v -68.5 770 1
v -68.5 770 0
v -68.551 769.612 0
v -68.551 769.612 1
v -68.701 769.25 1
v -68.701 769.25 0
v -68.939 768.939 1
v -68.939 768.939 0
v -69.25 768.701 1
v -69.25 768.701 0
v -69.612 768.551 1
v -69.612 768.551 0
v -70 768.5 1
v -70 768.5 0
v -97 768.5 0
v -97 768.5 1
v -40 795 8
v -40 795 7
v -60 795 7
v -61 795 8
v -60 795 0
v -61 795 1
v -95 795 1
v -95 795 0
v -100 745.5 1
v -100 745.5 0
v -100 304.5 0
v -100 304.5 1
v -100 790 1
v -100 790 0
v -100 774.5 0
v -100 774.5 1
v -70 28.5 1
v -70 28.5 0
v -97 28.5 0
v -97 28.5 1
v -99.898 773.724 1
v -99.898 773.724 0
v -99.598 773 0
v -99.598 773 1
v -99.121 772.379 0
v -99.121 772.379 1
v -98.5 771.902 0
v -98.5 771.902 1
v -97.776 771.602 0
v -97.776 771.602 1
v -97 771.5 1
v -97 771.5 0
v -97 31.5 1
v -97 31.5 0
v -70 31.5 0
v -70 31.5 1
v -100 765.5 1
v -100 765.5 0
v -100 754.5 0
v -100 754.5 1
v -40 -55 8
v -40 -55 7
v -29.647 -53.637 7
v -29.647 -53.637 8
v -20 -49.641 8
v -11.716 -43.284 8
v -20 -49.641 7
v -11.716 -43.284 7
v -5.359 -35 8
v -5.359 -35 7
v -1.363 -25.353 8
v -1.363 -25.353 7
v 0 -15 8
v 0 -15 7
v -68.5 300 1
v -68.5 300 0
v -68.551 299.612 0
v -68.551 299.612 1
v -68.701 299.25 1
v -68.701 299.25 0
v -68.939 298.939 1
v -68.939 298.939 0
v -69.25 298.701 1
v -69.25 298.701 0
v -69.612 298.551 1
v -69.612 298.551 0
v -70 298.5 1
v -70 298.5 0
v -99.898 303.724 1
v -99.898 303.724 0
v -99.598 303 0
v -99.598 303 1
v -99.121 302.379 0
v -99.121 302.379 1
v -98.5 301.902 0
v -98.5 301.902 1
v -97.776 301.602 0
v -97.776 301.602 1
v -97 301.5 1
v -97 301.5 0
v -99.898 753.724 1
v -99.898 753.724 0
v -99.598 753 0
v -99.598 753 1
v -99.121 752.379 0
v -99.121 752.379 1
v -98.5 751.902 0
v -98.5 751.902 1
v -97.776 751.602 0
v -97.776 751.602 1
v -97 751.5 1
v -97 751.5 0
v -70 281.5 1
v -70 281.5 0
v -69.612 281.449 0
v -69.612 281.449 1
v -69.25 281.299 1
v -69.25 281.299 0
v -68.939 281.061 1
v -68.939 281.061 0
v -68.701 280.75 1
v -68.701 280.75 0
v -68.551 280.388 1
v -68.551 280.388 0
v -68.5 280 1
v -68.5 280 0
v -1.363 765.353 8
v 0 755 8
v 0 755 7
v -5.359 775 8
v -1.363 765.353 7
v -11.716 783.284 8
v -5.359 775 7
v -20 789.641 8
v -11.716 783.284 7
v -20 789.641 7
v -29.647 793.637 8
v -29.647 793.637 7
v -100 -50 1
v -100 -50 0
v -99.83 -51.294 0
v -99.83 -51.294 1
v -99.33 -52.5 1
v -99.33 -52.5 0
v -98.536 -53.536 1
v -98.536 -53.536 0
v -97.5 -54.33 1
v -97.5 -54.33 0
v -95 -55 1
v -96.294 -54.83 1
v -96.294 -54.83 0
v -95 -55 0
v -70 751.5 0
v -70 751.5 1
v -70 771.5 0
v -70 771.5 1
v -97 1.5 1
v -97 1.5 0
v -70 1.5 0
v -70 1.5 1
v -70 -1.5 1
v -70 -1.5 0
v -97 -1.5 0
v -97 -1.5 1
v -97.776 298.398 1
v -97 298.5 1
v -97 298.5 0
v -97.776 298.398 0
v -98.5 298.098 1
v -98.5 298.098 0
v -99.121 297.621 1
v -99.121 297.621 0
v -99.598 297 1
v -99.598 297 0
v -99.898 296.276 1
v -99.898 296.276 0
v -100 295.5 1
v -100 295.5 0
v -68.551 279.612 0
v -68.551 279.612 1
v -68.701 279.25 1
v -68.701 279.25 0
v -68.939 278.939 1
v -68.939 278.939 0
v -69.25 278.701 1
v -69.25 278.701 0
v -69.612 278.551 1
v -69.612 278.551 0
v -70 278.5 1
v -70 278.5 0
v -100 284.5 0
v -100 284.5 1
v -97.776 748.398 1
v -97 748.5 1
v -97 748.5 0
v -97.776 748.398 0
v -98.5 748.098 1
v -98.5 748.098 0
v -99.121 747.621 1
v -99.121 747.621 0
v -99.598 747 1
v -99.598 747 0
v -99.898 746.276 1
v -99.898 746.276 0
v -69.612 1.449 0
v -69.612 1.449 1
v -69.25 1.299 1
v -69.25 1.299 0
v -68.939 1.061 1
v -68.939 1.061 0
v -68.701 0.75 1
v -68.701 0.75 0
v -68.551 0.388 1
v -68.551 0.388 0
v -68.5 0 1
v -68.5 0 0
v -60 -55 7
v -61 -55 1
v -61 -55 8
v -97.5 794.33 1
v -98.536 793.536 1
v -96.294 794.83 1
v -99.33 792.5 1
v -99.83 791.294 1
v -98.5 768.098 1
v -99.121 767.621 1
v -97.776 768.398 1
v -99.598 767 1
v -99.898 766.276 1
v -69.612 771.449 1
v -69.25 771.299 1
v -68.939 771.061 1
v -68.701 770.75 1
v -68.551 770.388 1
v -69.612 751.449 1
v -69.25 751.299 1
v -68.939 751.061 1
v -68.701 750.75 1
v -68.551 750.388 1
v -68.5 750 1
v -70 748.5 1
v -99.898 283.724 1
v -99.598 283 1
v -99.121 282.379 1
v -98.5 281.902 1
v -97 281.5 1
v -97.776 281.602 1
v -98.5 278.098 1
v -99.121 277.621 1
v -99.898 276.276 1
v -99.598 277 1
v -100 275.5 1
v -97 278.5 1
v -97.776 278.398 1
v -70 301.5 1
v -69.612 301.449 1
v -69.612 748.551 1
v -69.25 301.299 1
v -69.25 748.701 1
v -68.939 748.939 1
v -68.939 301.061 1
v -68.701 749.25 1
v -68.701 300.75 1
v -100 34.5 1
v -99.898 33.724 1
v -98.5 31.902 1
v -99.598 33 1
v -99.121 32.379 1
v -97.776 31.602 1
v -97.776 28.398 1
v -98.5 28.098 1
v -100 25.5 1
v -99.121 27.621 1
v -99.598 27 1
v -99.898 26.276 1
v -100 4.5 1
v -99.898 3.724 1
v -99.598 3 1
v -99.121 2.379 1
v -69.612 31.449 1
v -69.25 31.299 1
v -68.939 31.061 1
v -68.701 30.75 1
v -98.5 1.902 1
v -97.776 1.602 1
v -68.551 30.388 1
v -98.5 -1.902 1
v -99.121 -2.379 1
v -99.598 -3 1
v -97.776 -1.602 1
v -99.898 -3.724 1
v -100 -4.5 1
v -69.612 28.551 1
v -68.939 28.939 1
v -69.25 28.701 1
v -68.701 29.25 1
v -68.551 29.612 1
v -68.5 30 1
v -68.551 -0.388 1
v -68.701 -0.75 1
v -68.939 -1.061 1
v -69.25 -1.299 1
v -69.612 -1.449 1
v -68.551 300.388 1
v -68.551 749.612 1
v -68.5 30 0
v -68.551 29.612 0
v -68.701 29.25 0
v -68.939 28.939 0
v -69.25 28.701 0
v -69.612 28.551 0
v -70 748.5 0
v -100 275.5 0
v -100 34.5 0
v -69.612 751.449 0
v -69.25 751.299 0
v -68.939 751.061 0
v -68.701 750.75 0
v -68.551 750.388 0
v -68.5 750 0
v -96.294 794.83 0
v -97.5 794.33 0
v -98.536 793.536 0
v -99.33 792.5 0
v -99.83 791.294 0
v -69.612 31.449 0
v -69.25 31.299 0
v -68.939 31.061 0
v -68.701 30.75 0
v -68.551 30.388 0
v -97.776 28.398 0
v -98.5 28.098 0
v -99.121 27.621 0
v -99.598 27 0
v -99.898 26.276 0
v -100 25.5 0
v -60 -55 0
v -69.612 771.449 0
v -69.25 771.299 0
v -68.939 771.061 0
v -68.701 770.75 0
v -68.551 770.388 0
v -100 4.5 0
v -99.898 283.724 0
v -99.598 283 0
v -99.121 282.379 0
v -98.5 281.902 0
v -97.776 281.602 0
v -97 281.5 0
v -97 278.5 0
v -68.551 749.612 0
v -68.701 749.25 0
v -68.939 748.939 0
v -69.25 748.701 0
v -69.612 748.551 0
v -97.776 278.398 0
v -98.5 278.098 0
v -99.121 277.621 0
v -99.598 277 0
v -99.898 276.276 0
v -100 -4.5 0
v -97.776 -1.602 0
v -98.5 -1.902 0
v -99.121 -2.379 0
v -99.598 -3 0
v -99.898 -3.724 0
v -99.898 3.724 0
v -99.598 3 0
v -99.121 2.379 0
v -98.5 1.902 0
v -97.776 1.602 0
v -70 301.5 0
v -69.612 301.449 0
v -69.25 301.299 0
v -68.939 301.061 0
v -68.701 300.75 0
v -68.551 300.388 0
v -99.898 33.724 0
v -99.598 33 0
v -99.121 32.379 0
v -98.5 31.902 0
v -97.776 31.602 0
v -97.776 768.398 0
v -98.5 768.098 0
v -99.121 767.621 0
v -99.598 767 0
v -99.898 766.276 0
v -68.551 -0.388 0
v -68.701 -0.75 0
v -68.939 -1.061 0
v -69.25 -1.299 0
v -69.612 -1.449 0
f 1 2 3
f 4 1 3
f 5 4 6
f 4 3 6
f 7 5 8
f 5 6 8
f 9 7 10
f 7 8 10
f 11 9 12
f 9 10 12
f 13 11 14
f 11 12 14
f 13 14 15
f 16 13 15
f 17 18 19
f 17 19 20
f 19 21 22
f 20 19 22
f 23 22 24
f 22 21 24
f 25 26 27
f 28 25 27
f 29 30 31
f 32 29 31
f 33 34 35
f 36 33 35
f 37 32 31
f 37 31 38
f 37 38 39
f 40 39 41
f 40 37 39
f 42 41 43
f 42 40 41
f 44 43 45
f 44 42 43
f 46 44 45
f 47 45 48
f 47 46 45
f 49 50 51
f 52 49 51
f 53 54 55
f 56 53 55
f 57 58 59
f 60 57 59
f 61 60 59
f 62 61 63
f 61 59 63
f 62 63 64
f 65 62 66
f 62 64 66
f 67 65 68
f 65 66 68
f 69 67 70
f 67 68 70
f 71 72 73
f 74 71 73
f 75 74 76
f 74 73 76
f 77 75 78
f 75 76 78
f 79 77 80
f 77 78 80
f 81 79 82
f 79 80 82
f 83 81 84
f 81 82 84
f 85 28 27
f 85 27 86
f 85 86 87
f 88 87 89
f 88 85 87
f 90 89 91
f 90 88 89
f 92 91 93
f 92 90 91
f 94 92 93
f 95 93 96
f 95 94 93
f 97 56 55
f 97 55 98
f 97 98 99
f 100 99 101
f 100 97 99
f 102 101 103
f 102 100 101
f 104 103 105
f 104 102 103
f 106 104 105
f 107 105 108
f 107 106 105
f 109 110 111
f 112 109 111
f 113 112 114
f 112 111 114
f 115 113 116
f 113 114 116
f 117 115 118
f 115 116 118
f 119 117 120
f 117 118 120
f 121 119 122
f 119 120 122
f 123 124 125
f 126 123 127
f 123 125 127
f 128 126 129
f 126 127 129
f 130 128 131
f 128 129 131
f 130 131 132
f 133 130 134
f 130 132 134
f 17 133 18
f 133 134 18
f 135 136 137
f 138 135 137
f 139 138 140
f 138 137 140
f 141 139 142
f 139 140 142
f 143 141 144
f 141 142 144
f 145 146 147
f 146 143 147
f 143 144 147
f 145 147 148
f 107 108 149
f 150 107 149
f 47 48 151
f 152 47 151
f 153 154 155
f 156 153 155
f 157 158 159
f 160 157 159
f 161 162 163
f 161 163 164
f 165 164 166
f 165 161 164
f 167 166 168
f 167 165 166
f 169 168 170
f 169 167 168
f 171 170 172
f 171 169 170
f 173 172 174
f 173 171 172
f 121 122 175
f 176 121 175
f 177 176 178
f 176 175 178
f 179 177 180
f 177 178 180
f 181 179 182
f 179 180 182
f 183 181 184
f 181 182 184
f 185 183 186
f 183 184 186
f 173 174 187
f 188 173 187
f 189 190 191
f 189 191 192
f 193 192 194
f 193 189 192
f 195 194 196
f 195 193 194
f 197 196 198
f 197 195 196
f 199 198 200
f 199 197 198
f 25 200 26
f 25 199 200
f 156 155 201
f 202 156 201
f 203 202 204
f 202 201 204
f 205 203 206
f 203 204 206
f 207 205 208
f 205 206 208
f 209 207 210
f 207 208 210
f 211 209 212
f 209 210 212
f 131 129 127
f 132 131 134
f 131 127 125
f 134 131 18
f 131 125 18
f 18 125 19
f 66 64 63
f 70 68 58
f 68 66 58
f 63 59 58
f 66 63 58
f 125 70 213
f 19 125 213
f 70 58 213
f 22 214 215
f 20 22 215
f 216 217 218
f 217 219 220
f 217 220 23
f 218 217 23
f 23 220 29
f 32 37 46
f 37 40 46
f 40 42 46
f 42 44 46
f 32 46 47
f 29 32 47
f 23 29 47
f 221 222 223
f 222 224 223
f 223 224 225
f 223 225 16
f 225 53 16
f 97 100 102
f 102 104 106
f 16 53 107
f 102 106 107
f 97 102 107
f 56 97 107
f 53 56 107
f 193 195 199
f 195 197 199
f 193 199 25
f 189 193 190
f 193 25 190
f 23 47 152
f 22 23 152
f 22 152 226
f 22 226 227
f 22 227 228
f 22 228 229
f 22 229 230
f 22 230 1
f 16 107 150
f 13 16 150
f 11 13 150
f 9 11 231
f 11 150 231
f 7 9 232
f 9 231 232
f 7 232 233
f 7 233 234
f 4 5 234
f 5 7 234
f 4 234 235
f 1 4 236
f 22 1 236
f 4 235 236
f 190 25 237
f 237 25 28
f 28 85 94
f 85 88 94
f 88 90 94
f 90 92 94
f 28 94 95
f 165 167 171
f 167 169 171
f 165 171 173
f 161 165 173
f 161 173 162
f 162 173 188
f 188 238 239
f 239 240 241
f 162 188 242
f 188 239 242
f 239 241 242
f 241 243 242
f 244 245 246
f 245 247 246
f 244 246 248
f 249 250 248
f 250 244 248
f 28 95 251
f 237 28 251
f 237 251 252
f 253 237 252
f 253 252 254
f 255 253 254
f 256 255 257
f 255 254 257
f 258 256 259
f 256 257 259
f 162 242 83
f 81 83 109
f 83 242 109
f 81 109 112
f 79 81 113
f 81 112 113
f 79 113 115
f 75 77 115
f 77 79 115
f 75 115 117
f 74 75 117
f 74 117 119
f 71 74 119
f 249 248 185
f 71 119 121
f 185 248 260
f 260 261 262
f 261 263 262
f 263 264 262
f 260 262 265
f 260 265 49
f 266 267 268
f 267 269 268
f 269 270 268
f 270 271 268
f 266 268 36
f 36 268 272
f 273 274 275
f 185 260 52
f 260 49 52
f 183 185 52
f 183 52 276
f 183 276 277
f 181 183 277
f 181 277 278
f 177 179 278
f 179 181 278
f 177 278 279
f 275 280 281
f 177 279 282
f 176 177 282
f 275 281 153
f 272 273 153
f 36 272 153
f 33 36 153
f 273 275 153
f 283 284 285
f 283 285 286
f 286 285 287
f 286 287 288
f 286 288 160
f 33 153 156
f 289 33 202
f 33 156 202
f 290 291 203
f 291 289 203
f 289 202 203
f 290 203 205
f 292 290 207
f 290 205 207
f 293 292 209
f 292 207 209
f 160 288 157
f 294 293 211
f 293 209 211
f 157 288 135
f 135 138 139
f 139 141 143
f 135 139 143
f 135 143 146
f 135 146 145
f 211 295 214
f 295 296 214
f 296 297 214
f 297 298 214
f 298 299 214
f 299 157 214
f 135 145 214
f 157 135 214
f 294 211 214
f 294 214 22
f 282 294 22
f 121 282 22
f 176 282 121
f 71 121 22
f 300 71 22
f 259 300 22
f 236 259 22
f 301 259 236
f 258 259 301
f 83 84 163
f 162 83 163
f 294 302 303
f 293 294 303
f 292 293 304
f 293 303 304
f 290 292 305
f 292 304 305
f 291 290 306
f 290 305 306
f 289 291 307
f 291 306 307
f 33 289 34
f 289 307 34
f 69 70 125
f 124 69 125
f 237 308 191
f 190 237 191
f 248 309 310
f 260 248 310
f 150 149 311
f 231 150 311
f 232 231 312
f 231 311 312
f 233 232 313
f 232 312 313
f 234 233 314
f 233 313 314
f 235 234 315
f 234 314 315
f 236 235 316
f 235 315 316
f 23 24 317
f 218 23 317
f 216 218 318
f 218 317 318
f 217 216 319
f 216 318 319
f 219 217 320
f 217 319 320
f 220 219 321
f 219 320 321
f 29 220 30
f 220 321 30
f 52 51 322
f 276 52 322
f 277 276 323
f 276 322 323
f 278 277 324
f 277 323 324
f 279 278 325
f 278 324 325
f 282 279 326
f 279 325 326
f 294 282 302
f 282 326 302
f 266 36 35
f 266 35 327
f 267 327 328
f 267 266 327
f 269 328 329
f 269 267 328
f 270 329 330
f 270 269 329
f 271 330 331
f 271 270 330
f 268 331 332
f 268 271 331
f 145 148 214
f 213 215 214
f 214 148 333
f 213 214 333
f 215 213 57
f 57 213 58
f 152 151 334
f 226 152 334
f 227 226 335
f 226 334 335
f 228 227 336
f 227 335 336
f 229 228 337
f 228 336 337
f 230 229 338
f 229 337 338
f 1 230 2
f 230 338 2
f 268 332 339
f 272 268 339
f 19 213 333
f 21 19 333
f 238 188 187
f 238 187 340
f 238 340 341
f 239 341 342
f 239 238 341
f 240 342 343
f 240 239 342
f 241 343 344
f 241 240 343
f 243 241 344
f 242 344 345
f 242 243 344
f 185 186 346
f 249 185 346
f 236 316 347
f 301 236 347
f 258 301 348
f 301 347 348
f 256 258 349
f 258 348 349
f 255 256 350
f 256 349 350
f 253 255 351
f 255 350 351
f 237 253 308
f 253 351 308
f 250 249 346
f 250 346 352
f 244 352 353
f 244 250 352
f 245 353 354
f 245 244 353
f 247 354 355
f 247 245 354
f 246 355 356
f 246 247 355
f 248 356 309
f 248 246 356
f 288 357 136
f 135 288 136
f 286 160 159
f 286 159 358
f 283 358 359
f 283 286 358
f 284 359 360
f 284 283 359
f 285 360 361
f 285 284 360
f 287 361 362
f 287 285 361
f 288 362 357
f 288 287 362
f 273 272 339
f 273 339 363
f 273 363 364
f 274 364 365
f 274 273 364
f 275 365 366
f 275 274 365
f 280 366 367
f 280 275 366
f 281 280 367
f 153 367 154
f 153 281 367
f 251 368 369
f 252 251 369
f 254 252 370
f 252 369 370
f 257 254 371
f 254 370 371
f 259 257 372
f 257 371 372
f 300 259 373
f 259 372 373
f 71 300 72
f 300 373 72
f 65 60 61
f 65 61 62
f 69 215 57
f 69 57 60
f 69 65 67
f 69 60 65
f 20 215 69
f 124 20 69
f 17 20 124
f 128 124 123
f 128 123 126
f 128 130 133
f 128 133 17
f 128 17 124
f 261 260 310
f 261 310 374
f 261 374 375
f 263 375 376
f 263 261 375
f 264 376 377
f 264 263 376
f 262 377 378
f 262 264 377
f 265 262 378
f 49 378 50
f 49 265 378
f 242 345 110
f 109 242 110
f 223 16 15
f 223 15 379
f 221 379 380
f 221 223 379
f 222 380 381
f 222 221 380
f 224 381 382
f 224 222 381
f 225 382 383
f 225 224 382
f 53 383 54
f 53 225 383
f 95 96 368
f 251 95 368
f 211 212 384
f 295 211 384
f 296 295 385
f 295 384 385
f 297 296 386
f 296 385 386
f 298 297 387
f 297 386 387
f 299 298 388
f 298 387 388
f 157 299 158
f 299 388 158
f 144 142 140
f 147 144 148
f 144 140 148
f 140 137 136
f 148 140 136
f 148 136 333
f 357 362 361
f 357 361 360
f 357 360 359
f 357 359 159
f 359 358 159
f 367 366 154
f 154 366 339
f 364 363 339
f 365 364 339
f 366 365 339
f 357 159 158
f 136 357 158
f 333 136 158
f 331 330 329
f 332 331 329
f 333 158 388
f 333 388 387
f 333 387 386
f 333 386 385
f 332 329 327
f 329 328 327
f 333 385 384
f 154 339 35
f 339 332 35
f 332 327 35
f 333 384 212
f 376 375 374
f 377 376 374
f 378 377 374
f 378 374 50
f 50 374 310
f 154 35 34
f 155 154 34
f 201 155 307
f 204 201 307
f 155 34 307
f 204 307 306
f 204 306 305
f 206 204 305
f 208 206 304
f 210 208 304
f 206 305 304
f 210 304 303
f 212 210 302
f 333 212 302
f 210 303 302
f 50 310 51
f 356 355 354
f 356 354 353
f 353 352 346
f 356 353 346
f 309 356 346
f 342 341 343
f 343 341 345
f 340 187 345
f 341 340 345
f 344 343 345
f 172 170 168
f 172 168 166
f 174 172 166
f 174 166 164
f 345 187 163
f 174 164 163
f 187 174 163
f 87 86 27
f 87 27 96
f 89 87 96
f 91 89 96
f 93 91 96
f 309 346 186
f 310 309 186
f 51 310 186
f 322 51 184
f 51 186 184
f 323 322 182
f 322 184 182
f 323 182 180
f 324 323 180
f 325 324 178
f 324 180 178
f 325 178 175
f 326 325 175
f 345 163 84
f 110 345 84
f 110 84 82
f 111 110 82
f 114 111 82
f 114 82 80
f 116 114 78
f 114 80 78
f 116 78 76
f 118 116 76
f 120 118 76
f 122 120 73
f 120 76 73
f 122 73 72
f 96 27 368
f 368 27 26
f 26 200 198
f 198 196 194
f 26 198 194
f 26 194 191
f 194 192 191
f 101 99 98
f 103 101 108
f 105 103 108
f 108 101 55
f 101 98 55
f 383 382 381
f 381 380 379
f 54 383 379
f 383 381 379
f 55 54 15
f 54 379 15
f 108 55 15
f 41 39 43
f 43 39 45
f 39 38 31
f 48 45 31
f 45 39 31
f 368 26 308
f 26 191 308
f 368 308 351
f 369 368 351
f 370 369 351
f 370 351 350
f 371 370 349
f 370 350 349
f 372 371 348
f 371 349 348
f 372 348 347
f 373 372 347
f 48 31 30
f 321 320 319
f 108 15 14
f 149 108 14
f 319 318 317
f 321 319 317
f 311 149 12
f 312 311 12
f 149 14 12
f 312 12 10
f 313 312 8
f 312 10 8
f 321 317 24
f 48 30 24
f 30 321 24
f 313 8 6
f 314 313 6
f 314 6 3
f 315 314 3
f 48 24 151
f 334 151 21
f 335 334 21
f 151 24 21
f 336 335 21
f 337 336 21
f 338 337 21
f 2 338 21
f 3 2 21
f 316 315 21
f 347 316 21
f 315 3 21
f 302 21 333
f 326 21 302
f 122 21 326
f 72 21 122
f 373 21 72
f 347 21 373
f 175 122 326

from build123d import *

# Parameters (mm, degrees)
F1_DEPTH = 8
F2_R     = 3
F3_W     = 40
F3_H     = 7
F3_W_2   = 34
F3_W_3   = 25
F4_DEPTH = 1039


with BuildPart() as f1:
    # F0 (on Top) → F1 (new body)
    with BuildSketch(Plane.XY):
        with BuildLine():
            Line((-40, 795), (-95, 795))
            ThreePointArc((-95, 795), (-98.535534, 793.535534), (-100, 790))
            Line((-100, 790), (-100, 771.5))
            Line((-100, 771.5), (-70, 771.5))
            ThreePointArc((-70, 771.5), (-68.93934, 771.06066), (-68.5, 770))
            ThreePointArc((-68.5, 770), (-68.93934, 768.93934), (-70, 768.5))
            Line((-70, 768.5), (-100, 768.5))
            Line((-100, 768.5), (-100, 751.5))
            Line((-100, 751.5), (-70, 751.5))
            ThreePointArc((-70, 751.5), (-68.93934, 751.06066), (-68.5, 750))
            ThreePointArc((-68.5, 750), (-68.93934, 748.93934), (-70, 748.5))
            Line((-70, 748.5), (-100, 748.5))
            Line((-100, 748.5), (-100, 301.5))
            Line((-100, 301.5), (-70, 301.5))
            ThreePointArc((-70, 301.5), (-68.93934, 301.06066), (-68.5, 300))
            ThreePointArc((-68.5, 300), (-68.93934, 298.93934), (-70, 298.5))
            Line((-70, 298.5), (-100, 298.5))
            Line((-100, 298.5), (-100, 281.5))
            Line((-100, 281.5), (-70, 281.5))
            ThreePointArc((-70, 281.5), (-68.93934, 281.06066), (-68.5, 280))
            ThreePointArc((-68.5, 280), (-68.93934, 278.93934), (-70, 278.5))
            Line((-70, 278.5), (-100, 278.5))
            Line((-100, 278.5), (-100, 31.5))
            Line((-100, 31.5), (-70, 31.5))
            ThreePointArc((-70, 31.5), (-68.93934, 31.06066), (-68.5, 30))
            ThreePointArc((-68.5, 30), (-68.93934, 28.93934), (-70, 28.5))
            Line((-70, 28.5), (-100, 28.5))
            Line((-100, 28.5), (-100, 1.5))
            Line((-100, 1.5), (-70, 1.5))
            ThreePointArc((-70, 1.5), (-68.93934, 1.06066), (-68.5, 0))
            ThreePointArc((-68.5, 0), (-68.93934, -1.06066), (-70, -1.5))
            Line((-70, -1.5), (-100, -1.5))
            Line((-100, -1.5), (-100, -50))
            ThreePointArc((-100, -50), (-98.535534, -53.535534), (-95, -55))
            Line((-95, -55), (-40, -55))
            ThreePointArc((-40, -55), (-11.715729, -43.284271), (0, -15))
            Line((0, -15), (0, 755))
            ThreePointArc((0, 755), (-11.715729, 783.284271), (-40, 795))
        make_face()
    extrude(amount=F1_DEPTH)

    # F2
    f2_edges = [f1.edges().sort_by_distance(p)[0] for p in [
        (-100, 771.5, 4),
        (-100, 768.5, 4),
        (-100, 751.5, 4),
        (-100, 748.5, 4),
        (-100, 301.5, 4),
        (-100, 298.5, 4),
        (-100, 281.5, 4),
        (-100, 278.5, 4),
        (-100, 31.5, 4),
        (-100, 28.5, 4),
        (-100, 1.5, 4),
        (-100, -1.5, 4),
    ]]
    fillet(f2_edges, radius=F2_R)

    # F3 (on face) → F4 (cut)
    with BuildSketch(Plane.XZ.offset(55)):
        Polygon((-40, 0), (-40, 7), (-60, 7), (-60, 1), (-60, 0), align=None)
        with Locations((-20, 3.5)):
            Rectangle(F3_W, F3_H)
        with Locations((-78, 4.5)):
            Rectangle(F3_W_2, F3_H)
        with Locations((-107.5, 4.5)):
            Rectangle(F3_W_3, F3_H)
    extrude(amount=-F4_DEPTH, mode=Mode.SUBTRACT)


solid = f1.part
